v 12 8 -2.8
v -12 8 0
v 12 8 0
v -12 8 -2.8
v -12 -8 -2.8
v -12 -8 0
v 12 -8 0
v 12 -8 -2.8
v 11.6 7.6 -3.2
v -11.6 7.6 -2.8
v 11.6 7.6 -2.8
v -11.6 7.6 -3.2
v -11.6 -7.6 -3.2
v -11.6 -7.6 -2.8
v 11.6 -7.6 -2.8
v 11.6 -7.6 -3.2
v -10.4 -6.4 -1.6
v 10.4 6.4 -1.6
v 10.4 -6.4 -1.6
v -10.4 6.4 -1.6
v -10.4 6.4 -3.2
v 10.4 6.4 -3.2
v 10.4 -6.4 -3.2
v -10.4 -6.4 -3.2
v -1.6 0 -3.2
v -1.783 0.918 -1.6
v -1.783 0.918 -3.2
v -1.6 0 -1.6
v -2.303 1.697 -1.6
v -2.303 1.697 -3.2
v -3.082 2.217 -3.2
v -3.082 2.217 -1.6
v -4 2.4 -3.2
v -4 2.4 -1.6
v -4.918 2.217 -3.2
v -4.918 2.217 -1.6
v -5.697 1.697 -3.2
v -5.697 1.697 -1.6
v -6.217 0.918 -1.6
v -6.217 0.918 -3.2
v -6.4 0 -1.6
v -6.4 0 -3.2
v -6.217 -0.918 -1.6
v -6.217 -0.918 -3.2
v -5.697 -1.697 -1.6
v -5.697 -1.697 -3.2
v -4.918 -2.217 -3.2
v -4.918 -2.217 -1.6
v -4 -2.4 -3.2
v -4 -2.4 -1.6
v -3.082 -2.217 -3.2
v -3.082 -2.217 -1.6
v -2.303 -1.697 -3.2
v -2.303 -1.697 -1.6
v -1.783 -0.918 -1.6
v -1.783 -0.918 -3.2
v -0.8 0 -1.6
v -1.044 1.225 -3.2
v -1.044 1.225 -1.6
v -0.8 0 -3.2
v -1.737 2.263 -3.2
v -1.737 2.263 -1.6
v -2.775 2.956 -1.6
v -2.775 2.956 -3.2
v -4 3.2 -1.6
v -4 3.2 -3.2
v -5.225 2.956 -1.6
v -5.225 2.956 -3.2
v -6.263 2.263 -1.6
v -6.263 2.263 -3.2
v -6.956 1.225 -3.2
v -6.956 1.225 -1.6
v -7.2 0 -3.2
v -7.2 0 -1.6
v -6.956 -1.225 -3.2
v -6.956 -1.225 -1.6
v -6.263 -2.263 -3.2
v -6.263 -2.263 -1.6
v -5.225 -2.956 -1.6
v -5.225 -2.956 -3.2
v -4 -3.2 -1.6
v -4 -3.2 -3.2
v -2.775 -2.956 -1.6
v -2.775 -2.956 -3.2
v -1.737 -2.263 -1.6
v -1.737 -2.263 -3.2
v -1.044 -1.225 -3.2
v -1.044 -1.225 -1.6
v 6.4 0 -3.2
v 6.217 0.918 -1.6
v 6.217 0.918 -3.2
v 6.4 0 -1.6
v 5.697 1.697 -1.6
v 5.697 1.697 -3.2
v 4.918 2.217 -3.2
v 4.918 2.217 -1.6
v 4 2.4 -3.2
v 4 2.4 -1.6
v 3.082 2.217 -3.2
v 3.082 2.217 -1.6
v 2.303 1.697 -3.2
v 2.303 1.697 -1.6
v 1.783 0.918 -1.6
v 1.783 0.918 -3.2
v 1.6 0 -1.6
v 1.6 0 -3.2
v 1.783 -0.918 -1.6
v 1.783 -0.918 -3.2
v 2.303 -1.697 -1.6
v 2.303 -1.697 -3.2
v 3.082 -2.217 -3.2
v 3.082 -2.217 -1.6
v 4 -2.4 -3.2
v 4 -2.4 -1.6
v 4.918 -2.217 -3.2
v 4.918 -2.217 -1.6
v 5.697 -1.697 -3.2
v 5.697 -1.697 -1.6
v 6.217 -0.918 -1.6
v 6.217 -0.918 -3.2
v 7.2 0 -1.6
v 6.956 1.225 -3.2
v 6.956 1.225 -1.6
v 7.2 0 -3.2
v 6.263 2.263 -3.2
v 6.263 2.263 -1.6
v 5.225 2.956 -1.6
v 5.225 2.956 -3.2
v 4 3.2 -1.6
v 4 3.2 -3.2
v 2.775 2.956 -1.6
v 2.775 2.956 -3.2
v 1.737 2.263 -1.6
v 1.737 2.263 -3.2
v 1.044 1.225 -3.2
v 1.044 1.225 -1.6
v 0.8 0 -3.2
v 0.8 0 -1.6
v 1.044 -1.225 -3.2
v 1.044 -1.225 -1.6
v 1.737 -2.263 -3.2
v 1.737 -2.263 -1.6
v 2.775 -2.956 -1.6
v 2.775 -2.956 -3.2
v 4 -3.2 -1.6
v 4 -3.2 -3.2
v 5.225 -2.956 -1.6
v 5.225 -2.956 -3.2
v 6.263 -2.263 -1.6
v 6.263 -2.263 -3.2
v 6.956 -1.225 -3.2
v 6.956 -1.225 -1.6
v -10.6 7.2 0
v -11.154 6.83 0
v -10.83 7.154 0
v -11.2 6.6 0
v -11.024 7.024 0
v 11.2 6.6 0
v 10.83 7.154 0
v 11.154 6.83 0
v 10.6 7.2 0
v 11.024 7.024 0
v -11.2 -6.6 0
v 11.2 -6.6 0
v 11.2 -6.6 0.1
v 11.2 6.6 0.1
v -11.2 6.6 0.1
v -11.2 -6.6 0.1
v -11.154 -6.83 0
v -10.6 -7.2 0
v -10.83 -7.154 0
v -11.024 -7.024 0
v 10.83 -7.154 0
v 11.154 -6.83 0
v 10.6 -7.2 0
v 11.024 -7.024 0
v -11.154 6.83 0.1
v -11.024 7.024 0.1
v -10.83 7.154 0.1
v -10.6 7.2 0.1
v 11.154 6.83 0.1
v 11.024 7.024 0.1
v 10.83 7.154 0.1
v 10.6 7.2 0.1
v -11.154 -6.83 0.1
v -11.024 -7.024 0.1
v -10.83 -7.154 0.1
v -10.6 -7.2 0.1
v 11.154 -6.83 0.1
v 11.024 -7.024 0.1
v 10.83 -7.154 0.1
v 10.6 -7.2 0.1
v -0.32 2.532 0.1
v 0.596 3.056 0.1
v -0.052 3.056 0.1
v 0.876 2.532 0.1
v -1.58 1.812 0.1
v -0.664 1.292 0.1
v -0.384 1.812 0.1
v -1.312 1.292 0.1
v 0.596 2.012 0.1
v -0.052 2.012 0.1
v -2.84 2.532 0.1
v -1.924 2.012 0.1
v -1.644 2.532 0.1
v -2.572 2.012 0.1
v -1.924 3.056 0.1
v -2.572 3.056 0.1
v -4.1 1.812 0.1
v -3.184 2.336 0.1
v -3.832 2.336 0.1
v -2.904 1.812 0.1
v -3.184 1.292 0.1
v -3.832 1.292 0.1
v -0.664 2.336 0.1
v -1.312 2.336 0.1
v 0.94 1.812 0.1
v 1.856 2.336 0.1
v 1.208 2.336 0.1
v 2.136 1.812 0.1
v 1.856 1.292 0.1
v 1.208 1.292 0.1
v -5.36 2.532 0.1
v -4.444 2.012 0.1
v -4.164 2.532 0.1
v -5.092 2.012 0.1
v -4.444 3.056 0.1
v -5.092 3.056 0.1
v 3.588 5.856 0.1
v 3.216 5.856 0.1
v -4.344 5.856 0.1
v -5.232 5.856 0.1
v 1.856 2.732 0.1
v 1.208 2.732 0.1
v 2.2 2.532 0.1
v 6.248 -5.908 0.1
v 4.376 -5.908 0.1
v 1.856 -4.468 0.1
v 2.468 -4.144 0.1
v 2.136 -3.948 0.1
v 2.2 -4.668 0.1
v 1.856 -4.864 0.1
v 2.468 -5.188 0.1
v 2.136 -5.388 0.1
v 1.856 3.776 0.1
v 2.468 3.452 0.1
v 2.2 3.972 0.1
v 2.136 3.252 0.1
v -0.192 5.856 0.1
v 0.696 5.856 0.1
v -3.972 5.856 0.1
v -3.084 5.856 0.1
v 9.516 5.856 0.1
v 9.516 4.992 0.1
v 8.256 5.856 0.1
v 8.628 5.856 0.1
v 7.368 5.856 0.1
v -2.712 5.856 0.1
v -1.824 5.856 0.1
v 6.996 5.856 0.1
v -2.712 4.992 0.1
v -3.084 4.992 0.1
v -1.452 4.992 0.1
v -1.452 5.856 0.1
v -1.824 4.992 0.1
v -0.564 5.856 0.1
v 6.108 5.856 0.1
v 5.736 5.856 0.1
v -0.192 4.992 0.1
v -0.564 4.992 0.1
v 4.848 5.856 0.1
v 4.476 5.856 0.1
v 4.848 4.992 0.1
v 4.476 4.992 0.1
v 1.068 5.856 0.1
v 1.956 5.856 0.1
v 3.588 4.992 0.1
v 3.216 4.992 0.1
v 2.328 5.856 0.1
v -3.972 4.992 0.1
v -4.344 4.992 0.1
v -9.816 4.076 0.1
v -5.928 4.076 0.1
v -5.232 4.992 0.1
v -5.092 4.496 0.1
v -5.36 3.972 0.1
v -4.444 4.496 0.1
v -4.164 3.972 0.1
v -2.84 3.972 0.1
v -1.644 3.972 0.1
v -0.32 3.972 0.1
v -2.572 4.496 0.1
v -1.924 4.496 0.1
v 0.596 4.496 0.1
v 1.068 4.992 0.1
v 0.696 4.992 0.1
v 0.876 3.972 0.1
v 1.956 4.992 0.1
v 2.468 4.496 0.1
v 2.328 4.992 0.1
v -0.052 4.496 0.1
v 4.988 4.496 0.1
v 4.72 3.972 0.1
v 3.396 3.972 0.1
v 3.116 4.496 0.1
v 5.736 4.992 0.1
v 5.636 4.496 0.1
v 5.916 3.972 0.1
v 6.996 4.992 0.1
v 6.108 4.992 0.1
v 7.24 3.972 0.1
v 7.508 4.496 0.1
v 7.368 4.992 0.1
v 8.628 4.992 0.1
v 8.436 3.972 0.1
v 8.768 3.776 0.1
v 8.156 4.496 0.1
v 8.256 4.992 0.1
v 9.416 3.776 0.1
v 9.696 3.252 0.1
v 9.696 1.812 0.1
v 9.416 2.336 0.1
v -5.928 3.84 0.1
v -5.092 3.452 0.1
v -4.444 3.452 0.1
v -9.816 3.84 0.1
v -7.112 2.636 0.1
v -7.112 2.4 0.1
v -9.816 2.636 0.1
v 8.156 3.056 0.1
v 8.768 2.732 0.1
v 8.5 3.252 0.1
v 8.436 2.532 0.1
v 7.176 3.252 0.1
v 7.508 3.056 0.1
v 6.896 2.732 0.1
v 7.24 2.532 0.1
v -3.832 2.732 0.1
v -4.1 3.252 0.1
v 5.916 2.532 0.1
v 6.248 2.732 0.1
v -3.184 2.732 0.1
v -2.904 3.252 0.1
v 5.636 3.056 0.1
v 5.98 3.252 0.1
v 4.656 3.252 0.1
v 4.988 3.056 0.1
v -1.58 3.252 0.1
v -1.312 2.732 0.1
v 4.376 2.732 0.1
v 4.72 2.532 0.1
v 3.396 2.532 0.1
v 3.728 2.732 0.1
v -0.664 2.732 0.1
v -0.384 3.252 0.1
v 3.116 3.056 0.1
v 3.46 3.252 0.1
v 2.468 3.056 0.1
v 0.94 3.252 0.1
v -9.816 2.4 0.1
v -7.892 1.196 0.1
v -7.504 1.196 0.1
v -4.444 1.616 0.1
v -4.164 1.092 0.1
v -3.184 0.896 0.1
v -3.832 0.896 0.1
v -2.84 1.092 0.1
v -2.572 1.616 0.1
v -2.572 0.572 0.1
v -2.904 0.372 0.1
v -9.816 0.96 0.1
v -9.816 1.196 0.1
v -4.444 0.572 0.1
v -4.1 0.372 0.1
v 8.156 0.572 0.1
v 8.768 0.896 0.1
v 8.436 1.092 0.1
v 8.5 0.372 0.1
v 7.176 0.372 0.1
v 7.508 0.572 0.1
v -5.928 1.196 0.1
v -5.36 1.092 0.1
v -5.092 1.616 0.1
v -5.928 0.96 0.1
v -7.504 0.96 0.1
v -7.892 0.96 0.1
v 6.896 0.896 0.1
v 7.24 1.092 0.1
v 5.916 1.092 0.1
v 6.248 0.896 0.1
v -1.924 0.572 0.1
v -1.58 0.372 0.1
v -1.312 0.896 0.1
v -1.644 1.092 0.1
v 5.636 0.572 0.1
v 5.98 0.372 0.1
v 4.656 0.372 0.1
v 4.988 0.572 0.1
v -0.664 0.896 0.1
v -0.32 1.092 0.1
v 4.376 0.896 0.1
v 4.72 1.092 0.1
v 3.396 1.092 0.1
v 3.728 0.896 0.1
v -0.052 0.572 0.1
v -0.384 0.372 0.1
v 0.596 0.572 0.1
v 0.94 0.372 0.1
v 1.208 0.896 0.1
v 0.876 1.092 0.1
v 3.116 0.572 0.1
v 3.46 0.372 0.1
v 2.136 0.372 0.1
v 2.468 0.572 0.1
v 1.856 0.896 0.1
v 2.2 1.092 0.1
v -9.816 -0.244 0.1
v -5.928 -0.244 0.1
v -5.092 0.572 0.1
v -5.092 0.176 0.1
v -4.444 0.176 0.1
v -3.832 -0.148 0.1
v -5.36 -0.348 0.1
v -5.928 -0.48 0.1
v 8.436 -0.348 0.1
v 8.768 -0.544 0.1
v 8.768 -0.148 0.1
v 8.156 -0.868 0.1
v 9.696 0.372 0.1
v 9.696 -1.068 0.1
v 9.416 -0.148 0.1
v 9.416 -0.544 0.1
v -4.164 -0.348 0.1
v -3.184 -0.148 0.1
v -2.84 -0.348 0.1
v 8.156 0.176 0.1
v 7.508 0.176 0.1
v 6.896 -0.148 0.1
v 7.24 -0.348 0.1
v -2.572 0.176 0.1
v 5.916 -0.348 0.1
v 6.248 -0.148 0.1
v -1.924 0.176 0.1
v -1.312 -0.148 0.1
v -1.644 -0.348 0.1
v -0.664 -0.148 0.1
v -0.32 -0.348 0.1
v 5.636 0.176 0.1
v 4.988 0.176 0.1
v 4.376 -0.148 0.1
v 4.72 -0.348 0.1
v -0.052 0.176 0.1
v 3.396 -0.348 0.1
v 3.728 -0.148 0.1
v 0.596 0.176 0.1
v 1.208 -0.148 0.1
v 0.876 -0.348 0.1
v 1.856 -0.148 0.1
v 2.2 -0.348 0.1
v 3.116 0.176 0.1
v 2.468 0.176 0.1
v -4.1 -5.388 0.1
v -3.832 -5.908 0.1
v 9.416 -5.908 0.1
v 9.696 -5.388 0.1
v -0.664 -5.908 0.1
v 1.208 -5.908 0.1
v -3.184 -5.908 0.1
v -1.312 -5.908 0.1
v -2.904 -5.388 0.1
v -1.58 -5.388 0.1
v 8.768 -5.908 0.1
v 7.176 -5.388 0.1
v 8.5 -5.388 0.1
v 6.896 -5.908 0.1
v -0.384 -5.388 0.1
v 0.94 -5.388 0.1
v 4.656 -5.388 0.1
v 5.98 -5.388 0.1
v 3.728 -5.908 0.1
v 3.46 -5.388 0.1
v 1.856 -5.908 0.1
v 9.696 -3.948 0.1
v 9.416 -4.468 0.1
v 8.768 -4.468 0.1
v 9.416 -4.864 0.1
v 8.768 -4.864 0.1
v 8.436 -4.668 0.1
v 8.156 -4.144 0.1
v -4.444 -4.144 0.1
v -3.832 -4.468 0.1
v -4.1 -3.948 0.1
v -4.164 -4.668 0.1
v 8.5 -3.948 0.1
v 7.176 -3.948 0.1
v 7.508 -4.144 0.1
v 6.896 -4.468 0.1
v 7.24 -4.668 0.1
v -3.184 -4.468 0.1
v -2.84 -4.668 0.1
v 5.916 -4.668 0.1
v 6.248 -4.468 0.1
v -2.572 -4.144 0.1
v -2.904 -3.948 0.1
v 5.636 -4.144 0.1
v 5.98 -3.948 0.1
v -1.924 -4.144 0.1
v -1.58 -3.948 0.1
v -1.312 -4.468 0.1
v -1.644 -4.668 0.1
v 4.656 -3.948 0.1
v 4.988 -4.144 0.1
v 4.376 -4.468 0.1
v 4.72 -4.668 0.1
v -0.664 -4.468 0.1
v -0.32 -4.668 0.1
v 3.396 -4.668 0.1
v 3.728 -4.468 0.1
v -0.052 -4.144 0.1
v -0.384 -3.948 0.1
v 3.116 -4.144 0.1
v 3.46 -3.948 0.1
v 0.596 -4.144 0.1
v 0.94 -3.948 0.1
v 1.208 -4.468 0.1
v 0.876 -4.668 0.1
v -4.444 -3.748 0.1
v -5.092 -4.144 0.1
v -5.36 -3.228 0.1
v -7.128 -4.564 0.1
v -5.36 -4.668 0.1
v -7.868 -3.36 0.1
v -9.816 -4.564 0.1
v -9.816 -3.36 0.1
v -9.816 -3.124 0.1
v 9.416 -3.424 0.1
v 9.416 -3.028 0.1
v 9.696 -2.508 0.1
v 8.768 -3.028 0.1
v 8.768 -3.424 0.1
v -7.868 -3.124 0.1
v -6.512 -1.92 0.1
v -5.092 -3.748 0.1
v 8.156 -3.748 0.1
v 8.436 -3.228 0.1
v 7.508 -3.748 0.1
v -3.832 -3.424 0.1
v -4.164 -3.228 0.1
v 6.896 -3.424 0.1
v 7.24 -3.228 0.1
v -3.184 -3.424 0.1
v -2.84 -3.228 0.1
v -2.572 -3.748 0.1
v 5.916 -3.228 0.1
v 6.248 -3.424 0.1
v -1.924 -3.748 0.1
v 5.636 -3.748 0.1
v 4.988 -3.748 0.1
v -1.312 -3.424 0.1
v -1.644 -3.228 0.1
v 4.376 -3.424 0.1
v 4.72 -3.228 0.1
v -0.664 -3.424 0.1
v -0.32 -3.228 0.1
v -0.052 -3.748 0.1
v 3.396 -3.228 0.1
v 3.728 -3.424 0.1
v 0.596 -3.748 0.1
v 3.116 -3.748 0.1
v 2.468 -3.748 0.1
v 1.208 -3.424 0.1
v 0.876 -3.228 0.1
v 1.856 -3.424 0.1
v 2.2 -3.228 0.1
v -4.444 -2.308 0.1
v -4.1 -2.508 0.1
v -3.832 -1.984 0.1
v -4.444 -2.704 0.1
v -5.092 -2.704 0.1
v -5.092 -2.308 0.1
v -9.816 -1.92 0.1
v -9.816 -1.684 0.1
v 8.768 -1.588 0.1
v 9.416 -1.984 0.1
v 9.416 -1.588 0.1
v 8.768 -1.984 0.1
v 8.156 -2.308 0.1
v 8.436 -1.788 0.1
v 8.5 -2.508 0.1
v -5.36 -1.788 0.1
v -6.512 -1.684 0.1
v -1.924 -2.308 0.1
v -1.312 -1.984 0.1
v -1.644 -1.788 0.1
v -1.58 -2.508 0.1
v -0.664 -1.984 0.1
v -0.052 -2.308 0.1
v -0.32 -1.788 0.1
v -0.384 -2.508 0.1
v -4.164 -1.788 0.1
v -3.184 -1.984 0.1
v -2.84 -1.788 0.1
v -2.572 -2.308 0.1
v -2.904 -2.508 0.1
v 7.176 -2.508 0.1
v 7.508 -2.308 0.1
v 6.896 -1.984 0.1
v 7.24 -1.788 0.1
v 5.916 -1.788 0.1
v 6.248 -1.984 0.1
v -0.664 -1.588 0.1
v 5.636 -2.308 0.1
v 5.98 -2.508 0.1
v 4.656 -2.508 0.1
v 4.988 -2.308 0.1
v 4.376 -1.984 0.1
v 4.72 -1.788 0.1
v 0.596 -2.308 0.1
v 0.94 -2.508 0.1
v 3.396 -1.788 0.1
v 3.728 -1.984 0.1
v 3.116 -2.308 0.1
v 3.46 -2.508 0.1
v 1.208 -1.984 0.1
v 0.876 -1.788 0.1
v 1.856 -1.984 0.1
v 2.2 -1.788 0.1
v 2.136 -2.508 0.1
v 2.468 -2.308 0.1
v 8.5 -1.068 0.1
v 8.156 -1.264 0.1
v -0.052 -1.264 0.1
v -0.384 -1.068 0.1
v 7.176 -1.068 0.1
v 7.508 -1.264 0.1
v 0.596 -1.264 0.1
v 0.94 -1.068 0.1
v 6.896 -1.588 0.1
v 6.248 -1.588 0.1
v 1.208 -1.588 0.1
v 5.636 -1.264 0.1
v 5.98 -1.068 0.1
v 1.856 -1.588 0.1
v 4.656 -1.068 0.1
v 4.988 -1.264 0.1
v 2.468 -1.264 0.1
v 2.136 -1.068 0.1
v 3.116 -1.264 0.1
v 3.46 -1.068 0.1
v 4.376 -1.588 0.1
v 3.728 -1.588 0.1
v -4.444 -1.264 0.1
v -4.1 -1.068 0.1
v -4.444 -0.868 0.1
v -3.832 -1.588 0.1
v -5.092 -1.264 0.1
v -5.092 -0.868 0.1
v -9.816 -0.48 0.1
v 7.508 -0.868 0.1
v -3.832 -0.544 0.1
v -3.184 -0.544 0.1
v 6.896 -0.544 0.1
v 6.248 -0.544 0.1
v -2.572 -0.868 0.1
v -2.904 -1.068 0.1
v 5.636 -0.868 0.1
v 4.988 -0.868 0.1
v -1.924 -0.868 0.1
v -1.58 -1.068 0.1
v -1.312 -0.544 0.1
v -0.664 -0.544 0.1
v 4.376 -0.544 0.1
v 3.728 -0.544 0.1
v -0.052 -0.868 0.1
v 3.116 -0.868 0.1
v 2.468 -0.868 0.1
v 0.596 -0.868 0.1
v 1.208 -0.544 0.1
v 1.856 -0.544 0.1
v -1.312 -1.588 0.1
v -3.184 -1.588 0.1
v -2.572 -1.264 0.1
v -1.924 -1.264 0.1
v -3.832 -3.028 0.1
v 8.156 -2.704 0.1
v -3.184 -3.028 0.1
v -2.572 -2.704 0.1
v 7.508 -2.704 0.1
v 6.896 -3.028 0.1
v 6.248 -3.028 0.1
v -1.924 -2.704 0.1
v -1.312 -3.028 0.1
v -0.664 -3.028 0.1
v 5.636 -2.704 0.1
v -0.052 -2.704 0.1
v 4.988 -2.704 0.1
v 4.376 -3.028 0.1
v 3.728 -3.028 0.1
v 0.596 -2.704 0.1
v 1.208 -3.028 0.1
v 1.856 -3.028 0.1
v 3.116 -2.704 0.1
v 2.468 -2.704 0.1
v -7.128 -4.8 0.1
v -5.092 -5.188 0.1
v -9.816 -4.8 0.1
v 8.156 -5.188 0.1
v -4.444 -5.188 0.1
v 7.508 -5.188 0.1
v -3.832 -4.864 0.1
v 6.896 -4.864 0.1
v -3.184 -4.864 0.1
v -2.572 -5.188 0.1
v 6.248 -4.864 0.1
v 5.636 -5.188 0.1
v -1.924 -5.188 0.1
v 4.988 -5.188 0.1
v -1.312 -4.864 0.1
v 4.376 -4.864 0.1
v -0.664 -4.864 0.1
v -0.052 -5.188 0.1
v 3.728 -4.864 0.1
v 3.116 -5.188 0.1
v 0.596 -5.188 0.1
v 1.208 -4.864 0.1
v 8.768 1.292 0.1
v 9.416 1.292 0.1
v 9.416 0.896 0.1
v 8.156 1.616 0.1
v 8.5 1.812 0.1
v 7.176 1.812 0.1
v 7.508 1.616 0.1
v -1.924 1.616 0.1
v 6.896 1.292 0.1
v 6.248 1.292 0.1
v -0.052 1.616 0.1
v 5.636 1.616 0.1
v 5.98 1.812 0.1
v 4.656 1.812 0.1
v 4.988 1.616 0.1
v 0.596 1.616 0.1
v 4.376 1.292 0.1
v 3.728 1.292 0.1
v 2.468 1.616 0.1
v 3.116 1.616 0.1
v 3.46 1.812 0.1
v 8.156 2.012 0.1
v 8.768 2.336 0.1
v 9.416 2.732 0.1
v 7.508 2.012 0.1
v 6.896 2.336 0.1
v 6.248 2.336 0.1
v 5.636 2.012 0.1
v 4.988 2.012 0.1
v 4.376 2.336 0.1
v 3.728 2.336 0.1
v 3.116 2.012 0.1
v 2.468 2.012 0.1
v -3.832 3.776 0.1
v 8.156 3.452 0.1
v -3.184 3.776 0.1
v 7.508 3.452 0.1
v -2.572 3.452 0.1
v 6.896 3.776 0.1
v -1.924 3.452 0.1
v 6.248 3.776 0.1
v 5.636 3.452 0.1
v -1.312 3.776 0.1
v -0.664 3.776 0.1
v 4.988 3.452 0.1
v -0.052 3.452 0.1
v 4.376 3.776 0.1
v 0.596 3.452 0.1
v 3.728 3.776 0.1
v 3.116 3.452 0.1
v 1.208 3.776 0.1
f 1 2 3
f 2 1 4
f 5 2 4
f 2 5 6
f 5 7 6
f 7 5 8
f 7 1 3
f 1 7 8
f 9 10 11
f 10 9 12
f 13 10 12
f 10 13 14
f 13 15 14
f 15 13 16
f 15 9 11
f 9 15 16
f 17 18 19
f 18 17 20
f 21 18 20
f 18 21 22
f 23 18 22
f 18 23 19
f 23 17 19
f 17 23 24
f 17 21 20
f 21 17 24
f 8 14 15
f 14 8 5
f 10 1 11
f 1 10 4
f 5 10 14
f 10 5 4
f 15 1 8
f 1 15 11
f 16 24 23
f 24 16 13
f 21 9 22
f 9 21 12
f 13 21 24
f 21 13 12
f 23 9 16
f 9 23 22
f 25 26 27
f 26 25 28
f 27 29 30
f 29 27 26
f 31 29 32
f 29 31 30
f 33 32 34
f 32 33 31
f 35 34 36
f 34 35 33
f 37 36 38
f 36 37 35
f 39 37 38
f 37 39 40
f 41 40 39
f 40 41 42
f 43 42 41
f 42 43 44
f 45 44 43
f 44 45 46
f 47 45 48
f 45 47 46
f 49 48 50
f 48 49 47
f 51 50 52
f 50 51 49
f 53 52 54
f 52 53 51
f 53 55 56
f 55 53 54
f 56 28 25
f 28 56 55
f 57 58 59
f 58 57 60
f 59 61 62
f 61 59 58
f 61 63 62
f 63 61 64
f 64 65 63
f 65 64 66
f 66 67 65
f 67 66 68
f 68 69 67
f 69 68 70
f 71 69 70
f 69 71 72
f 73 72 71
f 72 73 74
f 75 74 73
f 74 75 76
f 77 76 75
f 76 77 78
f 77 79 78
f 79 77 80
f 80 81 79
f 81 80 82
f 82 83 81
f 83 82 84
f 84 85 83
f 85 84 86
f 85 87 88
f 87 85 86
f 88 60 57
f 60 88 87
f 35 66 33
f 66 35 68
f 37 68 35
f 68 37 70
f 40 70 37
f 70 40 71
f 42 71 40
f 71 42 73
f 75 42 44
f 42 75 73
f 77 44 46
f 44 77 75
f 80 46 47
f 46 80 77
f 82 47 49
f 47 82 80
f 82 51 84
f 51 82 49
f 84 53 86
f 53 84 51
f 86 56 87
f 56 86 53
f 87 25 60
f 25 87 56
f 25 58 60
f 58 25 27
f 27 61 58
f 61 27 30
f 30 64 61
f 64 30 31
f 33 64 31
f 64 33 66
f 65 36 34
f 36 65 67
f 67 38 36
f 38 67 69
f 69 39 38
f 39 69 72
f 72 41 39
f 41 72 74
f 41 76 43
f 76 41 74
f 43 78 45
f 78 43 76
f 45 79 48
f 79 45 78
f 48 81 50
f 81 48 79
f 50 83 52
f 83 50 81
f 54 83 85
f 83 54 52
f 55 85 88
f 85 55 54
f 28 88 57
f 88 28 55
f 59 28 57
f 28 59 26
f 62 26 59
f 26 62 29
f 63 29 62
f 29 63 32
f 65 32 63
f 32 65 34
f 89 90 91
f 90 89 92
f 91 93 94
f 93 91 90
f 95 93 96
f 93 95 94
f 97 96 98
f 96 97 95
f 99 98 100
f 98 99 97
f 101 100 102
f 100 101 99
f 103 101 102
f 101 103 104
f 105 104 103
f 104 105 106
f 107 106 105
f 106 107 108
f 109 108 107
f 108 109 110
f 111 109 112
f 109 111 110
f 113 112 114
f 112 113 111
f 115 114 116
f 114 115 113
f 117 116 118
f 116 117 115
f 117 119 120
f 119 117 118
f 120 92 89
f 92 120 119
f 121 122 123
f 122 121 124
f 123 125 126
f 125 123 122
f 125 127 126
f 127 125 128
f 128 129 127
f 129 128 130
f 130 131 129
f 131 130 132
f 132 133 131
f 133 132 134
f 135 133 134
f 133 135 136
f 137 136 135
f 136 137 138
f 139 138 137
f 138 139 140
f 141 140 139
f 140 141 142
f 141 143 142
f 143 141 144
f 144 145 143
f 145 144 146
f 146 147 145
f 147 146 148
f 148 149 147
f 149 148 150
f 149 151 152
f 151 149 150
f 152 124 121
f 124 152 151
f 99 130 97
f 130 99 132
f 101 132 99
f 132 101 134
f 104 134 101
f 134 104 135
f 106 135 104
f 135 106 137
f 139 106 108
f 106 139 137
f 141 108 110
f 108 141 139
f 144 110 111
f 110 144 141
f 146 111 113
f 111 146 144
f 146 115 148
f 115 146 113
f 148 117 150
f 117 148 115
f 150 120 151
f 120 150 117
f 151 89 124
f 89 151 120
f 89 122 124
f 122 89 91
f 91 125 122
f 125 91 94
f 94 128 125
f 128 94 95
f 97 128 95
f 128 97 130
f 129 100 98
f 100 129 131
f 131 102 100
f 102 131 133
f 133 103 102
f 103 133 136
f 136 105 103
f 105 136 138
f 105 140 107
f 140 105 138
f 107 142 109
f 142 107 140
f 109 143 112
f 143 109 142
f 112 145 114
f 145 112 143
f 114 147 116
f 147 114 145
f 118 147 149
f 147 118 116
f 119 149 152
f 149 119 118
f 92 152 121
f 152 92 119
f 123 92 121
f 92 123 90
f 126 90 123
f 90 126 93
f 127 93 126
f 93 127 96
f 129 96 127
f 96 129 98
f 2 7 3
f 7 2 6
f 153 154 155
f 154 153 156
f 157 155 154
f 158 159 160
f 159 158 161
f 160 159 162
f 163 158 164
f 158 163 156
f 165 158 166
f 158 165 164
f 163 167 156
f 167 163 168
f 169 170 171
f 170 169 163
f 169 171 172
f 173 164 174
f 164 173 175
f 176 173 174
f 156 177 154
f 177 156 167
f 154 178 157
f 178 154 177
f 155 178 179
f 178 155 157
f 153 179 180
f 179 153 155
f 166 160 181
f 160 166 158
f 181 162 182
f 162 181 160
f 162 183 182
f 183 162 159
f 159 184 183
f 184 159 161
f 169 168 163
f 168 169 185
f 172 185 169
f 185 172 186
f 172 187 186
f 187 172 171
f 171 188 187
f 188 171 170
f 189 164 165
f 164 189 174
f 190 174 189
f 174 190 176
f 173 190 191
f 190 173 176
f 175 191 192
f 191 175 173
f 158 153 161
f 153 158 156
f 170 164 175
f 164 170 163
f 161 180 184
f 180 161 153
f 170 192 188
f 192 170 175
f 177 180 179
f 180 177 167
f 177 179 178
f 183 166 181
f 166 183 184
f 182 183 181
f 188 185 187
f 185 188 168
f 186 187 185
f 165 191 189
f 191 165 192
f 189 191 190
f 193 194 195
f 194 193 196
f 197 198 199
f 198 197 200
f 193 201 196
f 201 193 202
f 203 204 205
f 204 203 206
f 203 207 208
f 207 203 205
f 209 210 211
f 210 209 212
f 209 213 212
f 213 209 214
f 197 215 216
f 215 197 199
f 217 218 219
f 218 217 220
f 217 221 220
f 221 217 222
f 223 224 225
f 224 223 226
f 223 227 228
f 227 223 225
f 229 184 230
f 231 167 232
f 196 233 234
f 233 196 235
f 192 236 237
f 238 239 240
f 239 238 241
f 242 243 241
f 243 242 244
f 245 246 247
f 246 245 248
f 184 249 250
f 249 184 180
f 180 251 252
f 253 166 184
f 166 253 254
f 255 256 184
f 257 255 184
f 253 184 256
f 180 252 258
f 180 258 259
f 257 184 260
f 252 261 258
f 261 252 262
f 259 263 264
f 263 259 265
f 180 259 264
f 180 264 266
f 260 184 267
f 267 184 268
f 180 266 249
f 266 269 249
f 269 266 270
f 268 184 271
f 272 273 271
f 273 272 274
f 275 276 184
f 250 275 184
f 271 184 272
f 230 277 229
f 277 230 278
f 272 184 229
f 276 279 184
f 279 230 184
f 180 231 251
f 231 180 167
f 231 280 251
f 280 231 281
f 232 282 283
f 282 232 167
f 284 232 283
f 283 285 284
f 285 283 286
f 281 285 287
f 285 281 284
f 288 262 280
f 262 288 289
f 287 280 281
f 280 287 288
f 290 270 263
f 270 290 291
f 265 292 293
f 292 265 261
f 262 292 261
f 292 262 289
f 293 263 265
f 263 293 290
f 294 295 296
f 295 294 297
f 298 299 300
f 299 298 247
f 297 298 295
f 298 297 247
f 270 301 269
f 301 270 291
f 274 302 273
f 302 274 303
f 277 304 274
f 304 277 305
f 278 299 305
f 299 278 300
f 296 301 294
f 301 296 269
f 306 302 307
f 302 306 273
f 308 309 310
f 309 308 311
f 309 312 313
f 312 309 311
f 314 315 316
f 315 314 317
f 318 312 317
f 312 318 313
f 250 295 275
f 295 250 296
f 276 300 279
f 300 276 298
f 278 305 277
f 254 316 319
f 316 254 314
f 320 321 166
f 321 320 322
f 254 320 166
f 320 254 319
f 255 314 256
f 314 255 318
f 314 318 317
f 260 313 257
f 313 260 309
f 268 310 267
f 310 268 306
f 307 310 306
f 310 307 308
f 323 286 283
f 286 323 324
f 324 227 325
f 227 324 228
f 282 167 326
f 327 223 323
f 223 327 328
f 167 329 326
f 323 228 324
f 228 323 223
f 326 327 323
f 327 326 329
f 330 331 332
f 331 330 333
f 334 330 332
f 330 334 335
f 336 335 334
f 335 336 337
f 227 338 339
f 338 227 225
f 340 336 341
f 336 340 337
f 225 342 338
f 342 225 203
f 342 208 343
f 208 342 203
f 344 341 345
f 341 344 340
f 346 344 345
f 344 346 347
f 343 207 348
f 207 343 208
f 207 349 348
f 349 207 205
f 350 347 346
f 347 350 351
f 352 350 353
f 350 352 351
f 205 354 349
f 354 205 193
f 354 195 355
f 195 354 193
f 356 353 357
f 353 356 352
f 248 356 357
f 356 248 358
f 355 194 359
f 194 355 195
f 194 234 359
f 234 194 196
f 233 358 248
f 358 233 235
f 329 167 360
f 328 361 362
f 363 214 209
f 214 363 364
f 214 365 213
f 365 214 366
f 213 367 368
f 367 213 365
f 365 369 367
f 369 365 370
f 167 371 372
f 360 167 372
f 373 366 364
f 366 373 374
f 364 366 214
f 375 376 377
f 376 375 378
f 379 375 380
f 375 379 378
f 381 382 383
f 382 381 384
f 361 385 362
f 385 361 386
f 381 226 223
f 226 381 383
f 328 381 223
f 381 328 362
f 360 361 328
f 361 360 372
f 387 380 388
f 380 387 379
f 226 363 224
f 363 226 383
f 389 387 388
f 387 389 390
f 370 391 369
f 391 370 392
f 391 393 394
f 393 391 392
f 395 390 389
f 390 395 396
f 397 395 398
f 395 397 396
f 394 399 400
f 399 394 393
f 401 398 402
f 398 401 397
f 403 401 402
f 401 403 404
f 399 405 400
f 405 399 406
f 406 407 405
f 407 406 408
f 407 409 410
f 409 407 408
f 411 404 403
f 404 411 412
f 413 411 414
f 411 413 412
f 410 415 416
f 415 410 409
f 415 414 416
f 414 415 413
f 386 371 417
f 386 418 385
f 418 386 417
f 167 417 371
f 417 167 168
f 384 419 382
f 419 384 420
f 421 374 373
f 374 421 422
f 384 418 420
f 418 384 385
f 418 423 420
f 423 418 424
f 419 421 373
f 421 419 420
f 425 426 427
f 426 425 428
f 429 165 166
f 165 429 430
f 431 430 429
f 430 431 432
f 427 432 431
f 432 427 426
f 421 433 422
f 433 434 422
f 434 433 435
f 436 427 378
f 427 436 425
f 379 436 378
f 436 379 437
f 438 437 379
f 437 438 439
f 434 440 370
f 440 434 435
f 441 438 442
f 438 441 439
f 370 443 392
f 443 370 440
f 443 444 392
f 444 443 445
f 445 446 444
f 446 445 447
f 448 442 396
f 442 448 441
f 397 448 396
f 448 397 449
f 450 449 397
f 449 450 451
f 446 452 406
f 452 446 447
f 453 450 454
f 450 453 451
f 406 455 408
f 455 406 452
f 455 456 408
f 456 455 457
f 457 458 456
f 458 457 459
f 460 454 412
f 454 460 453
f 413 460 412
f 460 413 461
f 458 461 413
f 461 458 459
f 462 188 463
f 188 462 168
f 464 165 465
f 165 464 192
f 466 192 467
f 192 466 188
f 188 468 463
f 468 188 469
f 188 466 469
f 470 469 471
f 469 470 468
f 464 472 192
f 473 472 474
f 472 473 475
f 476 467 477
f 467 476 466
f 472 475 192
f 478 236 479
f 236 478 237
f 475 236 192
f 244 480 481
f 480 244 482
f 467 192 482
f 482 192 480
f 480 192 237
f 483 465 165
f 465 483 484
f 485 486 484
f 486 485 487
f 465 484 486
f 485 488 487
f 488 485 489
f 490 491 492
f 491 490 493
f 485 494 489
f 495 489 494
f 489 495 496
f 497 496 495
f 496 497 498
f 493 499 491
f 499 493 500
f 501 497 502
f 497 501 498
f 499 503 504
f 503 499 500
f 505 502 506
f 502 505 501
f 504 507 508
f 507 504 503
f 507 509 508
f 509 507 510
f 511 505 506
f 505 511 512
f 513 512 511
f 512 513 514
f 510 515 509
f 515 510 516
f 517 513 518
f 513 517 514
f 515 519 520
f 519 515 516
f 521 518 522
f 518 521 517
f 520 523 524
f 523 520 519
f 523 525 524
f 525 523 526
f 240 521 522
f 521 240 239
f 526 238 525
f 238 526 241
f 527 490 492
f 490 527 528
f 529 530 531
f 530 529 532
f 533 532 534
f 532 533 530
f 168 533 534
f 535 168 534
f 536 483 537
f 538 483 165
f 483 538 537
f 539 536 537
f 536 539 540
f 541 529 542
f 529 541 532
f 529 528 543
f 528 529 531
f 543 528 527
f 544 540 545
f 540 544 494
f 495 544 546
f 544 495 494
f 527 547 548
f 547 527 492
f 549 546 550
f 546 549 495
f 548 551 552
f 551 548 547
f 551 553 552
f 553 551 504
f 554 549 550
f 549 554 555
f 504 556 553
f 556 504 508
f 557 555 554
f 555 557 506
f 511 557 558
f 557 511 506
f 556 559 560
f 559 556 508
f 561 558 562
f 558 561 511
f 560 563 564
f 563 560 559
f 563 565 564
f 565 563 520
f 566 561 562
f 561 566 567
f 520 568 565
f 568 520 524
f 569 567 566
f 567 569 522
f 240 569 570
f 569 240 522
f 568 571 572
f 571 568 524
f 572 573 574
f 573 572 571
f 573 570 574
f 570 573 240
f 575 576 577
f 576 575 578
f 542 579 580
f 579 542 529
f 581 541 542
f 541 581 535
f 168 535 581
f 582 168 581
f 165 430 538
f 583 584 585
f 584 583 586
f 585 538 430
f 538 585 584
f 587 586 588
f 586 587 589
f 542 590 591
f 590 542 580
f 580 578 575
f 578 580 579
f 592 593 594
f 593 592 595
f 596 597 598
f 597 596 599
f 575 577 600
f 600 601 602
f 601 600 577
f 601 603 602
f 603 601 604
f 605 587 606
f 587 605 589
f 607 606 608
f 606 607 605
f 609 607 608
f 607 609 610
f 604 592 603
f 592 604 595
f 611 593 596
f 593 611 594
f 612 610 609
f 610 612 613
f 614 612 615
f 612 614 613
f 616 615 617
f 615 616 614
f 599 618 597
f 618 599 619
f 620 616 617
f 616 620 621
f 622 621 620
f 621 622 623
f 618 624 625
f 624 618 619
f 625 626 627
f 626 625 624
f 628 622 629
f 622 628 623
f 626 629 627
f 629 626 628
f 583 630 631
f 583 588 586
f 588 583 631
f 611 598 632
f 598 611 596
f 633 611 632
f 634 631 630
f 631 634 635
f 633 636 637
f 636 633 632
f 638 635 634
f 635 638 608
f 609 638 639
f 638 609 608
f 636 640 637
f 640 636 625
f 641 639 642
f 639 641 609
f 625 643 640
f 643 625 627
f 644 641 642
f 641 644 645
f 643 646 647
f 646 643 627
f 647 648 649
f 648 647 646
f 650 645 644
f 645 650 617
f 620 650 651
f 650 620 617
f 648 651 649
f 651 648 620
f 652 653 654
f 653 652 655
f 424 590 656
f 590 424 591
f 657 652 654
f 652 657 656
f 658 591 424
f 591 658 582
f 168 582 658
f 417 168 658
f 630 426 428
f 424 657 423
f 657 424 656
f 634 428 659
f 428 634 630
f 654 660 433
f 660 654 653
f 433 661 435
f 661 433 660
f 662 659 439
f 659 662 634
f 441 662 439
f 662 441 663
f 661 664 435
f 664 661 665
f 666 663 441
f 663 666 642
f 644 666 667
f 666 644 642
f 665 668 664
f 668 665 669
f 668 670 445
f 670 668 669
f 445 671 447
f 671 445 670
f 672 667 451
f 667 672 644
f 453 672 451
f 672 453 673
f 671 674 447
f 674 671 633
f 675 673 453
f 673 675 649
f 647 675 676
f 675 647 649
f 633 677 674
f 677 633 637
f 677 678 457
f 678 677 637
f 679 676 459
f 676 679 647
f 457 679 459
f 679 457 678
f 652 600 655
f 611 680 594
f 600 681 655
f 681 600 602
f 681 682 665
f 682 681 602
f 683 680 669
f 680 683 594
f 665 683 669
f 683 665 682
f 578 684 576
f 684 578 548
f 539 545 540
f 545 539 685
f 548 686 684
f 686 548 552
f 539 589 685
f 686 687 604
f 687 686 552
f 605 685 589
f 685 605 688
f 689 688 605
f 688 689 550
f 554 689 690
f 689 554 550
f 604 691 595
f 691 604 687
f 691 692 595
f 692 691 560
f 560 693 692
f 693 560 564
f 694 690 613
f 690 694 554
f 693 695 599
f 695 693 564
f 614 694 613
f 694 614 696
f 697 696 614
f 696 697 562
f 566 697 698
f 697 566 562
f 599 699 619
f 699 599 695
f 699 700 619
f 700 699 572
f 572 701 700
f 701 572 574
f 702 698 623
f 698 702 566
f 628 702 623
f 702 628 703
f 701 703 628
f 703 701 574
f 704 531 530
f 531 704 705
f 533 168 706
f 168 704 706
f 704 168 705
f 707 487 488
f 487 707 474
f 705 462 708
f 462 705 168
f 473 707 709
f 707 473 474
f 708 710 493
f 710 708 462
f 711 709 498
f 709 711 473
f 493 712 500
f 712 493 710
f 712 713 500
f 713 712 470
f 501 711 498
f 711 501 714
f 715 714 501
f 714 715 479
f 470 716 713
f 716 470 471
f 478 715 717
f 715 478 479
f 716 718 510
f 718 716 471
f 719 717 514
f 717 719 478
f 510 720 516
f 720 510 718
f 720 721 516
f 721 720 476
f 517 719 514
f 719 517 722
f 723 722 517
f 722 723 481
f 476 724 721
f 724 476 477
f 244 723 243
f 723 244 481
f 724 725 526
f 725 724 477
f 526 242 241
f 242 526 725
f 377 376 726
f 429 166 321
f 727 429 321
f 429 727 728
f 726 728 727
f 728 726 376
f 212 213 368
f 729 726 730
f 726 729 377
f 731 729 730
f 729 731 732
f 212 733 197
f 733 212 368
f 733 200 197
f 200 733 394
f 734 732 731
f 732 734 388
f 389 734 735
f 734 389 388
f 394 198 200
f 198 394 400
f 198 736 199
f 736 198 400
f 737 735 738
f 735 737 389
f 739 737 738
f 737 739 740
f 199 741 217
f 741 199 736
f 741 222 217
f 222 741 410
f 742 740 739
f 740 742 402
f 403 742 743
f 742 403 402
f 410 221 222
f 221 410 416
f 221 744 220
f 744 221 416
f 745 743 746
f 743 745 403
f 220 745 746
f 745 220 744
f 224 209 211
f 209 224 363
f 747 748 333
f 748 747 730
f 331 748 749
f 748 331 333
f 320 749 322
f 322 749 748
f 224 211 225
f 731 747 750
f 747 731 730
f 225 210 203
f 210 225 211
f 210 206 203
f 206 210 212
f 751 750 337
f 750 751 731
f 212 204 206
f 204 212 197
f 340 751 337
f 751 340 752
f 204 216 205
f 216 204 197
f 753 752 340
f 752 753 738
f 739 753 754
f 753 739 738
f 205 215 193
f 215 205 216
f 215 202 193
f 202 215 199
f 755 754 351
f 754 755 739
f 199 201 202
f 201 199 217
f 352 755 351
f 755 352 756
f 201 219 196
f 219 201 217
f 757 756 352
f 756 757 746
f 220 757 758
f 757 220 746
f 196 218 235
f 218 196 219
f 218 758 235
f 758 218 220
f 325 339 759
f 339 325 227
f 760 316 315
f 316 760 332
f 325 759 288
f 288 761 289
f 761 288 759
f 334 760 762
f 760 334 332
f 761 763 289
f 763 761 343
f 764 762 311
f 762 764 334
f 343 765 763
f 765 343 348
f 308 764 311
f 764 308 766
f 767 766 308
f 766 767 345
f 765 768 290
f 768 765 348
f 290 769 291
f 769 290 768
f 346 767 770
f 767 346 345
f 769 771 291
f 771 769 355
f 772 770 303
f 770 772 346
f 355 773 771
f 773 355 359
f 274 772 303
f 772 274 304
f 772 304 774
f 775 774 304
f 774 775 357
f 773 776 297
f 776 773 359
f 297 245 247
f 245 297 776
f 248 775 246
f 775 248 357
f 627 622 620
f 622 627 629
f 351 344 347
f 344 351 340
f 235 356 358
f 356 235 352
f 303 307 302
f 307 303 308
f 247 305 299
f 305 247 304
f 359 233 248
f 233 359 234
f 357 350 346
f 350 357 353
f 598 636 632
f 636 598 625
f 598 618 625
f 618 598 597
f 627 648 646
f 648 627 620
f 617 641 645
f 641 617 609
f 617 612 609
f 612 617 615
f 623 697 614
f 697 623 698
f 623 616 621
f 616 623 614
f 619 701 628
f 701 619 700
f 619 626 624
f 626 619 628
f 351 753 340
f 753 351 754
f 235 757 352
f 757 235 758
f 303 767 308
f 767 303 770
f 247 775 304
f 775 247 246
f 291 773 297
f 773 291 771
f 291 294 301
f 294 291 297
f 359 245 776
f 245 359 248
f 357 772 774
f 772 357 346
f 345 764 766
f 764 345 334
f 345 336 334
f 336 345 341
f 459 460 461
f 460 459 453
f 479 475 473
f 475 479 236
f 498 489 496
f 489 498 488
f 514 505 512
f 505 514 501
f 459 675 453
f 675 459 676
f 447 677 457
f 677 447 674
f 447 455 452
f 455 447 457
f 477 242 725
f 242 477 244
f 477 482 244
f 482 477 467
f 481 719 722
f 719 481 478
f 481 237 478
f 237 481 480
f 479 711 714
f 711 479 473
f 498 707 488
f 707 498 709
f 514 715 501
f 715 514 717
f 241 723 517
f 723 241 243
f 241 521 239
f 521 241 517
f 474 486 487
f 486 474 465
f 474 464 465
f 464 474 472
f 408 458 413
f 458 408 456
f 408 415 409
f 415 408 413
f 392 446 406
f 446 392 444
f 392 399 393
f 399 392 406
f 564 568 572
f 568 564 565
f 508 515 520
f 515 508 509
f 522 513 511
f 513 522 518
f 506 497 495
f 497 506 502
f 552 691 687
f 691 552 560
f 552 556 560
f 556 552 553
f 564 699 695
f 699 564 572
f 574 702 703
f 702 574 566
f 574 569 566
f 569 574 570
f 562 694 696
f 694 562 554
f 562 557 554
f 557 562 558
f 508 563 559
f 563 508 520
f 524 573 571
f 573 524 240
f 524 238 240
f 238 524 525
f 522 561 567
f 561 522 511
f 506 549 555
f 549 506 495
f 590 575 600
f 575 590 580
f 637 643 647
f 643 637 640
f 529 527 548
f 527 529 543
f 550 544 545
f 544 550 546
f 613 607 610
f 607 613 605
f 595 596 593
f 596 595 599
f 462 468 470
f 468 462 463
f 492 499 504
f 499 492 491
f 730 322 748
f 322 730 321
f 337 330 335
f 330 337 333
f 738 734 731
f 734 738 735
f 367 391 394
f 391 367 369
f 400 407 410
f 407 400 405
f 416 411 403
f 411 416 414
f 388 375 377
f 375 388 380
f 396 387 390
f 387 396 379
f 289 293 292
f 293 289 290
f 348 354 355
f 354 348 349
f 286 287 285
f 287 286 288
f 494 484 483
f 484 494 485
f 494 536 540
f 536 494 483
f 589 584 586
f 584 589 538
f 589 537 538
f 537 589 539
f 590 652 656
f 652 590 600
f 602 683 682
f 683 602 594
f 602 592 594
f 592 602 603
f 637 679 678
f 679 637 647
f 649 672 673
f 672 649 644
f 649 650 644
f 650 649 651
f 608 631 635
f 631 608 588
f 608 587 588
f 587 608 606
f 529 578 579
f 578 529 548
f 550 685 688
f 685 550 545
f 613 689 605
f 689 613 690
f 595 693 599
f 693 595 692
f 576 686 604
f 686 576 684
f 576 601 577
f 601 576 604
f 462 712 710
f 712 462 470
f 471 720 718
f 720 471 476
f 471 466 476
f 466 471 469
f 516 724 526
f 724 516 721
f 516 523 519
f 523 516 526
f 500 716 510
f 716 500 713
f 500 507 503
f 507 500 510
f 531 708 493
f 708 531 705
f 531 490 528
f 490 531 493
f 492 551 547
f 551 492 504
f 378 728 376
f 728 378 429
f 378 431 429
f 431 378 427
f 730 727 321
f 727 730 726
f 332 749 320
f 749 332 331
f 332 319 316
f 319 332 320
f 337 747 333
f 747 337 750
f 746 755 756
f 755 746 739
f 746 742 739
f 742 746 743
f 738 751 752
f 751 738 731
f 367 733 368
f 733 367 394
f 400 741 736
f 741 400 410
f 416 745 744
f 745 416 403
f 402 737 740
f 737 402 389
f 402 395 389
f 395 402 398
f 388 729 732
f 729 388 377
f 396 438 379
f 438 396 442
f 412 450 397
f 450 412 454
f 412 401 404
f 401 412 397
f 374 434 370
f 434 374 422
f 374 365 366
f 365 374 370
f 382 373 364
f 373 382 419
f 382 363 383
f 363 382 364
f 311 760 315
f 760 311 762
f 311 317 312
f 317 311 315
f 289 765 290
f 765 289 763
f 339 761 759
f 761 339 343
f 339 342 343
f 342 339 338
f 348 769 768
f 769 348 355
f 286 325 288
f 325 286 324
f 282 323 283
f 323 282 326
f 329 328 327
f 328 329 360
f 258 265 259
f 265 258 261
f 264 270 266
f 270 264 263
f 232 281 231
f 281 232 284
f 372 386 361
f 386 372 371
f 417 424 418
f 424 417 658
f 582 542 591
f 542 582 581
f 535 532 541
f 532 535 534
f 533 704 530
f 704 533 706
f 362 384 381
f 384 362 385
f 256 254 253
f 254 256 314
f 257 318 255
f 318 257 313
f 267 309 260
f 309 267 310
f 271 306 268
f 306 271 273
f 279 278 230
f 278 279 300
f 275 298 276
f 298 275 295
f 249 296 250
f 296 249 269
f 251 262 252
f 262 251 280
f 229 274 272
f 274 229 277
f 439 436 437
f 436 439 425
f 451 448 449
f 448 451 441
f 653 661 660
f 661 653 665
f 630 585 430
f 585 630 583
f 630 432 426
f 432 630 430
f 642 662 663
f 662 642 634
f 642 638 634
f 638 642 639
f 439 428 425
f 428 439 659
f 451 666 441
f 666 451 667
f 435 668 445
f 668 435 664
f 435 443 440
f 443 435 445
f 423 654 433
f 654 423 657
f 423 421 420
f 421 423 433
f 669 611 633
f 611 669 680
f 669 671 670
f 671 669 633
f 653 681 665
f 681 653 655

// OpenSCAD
use <../lib.scad>
use <26603.scad>
use <6521012c.scad>
function ldraw_lib__26603d0f() = [
// 0 Tile  2 x  3 with Beekeeper Planning Sticker
// 0 Name: 26603d0f.dat
// 0 Author: Philippe Hurbain [Philo]
// 0 !LDRAW_ORG Shortcut UPDATE 2026-07
// 0 !LICENSE Licensed under CC BY 4.0 : see CAreadme.txt
// 
// 0 BFC CERTIFY CCW
  [0,"BFC","CERTIFY"],
  [0,"BFC","CCW"],
// 
// 0 !CATEGORY Sticker Shortcut
// 0 !KEYWORDS Beekeepers' House and Flower Garden, Friends, Rebrickable 10110453
// 0 !KEYWORDS Set 42669
// 
// 0 !HISTORY 2026-07-30 [OrionP] Official Update 2026-07
// 
// 1 16 0 0 0 1 0 0 0 1 0 0 0 1 26603.dat
  [1,16,0,0,0,1,0,0,0,1,0,0,0,1, ldraw_lib__26603()],
// 1 16 0 0 0 1 0 0 0 1 0 0 0 1 6521012c.dat
  [1,16,0,0,0,1,0,0,0,1,0,0,0,1, ldraw_lib__6521012c()],
];
module ldraw_lib__26603d0f(step=0, col=false, unit=2/5, alt=false, line=0.2, solid=!$preview)
    makepoly(ldraw_lib__26603d0f(), step=step, col=col, unit=unit, alt=alt, line=line, solid=solid);
ldraw_lib__26603d0f(line=0.2);
